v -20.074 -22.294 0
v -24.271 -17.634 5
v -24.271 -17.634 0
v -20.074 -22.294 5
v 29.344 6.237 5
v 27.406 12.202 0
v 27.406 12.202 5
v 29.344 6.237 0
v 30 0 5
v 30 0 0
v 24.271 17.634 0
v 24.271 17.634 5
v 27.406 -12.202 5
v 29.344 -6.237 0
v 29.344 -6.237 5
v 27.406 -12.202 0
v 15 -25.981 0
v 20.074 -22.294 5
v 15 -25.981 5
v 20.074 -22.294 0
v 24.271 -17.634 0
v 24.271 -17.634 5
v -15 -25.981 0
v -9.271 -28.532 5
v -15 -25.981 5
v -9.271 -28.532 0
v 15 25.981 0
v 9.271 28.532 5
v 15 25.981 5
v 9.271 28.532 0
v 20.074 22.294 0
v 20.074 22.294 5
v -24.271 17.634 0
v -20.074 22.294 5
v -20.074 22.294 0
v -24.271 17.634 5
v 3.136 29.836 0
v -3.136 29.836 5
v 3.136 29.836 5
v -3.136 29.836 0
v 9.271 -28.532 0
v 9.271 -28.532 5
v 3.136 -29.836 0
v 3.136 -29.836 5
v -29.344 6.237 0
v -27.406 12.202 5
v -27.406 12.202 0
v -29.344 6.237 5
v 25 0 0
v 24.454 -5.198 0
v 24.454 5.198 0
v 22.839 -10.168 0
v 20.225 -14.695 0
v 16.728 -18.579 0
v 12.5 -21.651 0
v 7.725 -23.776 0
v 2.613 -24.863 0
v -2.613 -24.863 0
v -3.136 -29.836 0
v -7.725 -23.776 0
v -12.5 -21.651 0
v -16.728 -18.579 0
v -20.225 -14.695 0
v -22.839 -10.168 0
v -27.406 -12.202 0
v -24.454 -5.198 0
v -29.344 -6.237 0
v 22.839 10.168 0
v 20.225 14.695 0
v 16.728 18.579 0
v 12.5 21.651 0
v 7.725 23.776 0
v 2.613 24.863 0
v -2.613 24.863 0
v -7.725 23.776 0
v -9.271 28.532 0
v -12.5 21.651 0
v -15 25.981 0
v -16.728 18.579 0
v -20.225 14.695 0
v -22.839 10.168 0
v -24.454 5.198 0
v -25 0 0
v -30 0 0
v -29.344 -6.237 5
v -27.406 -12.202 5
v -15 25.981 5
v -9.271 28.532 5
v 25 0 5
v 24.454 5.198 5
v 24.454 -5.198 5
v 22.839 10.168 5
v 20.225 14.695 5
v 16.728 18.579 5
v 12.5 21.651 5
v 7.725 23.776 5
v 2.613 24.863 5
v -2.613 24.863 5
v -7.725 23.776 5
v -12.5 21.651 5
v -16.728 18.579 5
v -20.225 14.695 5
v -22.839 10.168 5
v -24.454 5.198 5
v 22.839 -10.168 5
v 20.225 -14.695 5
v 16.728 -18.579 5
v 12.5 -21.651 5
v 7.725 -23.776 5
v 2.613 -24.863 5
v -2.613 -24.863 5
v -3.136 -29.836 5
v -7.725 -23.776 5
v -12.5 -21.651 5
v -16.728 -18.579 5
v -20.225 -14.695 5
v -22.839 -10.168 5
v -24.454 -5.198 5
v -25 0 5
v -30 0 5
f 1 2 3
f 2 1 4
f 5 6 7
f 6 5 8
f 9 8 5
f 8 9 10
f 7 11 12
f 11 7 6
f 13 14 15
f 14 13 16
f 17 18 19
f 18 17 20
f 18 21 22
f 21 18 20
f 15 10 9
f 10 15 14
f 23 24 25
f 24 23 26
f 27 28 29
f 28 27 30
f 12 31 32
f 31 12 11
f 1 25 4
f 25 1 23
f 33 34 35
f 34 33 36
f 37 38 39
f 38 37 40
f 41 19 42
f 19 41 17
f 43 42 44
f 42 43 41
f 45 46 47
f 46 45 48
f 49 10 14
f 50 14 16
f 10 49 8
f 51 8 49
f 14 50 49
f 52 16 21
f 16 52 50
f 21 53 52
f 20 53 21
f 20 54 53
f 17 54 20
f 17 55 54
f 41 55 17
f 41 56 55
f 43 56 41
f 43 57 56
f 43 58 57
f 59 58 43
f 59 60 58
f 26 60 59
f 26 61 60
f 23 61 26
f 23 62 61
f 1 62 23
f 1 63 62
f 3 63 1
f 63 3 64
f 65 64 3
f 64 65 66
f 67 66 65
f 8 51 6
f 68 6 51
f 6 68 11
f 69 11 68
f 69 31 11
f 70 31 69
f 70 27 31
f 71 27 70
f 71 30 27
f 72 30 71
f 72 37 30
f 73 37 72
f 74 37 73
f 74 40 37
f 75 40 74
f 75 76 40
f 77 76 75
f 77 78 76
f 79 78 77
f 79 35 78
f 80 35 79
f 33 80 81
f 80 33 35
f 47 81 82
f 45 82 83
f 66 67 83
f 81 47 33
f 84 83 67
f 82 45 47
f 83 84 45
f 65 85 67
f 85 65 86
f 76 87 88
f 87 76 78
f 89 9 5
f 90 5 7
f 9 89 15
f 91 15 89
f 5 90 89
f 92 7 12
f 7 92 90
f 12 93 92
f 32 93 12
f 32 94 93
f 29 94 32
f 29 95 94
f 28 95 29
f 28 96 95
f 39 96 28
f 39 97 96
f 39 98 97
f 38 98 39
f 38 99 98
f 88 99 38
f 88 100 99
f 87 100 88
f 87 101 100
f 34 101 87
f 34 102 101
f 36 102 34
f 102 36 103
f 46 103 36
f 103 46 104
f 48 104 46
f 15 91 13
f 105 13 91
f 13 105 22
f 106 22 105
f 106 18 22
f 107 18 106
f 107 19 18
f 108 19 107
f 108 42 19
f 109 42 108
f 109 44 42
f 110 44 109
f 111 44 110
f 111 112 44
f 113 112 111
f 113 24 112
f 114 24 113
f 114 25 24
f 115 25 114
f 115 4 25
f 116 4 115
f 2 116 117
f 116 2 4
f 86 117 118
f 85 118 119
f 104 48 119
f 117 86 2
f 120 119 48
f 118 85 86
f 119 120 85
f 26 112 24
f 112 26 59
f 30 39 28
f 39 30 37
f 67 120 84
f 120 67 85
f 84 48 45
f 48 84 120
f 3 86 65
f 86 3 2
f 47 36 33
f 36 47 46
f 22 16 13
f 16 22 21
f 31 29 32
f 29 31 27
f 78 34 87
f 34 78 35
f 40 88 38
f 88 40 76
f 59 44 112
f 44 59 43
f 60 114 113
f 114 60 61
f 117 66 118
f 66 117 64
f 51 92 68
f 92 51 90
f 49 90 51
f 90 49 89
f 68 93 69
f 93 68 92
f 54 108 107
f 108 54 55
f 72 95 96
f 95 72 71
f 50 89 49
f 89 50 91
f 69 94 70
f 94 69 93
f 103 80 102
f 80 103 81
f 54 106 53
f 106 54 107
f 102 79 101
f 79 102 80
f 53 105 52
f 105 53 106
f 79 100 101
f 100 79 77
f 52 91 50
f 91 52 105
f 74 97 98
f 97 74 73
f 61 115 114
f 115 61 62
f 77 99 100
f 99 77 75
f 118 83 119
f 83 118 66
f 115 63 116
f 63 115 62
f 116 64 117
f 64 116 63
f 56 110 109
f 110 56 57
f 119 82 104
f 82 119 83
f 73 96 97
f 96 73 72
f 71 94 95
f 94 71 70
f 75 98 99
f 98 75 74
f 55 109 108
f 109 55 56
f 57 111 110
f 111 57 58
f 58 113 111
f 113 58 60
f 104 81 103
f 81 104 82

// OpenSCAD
dist = 40;
socket = 50;


difference(){
    cylinder(5, d=socket+10);
    cylinder(35, d=socket);
}
